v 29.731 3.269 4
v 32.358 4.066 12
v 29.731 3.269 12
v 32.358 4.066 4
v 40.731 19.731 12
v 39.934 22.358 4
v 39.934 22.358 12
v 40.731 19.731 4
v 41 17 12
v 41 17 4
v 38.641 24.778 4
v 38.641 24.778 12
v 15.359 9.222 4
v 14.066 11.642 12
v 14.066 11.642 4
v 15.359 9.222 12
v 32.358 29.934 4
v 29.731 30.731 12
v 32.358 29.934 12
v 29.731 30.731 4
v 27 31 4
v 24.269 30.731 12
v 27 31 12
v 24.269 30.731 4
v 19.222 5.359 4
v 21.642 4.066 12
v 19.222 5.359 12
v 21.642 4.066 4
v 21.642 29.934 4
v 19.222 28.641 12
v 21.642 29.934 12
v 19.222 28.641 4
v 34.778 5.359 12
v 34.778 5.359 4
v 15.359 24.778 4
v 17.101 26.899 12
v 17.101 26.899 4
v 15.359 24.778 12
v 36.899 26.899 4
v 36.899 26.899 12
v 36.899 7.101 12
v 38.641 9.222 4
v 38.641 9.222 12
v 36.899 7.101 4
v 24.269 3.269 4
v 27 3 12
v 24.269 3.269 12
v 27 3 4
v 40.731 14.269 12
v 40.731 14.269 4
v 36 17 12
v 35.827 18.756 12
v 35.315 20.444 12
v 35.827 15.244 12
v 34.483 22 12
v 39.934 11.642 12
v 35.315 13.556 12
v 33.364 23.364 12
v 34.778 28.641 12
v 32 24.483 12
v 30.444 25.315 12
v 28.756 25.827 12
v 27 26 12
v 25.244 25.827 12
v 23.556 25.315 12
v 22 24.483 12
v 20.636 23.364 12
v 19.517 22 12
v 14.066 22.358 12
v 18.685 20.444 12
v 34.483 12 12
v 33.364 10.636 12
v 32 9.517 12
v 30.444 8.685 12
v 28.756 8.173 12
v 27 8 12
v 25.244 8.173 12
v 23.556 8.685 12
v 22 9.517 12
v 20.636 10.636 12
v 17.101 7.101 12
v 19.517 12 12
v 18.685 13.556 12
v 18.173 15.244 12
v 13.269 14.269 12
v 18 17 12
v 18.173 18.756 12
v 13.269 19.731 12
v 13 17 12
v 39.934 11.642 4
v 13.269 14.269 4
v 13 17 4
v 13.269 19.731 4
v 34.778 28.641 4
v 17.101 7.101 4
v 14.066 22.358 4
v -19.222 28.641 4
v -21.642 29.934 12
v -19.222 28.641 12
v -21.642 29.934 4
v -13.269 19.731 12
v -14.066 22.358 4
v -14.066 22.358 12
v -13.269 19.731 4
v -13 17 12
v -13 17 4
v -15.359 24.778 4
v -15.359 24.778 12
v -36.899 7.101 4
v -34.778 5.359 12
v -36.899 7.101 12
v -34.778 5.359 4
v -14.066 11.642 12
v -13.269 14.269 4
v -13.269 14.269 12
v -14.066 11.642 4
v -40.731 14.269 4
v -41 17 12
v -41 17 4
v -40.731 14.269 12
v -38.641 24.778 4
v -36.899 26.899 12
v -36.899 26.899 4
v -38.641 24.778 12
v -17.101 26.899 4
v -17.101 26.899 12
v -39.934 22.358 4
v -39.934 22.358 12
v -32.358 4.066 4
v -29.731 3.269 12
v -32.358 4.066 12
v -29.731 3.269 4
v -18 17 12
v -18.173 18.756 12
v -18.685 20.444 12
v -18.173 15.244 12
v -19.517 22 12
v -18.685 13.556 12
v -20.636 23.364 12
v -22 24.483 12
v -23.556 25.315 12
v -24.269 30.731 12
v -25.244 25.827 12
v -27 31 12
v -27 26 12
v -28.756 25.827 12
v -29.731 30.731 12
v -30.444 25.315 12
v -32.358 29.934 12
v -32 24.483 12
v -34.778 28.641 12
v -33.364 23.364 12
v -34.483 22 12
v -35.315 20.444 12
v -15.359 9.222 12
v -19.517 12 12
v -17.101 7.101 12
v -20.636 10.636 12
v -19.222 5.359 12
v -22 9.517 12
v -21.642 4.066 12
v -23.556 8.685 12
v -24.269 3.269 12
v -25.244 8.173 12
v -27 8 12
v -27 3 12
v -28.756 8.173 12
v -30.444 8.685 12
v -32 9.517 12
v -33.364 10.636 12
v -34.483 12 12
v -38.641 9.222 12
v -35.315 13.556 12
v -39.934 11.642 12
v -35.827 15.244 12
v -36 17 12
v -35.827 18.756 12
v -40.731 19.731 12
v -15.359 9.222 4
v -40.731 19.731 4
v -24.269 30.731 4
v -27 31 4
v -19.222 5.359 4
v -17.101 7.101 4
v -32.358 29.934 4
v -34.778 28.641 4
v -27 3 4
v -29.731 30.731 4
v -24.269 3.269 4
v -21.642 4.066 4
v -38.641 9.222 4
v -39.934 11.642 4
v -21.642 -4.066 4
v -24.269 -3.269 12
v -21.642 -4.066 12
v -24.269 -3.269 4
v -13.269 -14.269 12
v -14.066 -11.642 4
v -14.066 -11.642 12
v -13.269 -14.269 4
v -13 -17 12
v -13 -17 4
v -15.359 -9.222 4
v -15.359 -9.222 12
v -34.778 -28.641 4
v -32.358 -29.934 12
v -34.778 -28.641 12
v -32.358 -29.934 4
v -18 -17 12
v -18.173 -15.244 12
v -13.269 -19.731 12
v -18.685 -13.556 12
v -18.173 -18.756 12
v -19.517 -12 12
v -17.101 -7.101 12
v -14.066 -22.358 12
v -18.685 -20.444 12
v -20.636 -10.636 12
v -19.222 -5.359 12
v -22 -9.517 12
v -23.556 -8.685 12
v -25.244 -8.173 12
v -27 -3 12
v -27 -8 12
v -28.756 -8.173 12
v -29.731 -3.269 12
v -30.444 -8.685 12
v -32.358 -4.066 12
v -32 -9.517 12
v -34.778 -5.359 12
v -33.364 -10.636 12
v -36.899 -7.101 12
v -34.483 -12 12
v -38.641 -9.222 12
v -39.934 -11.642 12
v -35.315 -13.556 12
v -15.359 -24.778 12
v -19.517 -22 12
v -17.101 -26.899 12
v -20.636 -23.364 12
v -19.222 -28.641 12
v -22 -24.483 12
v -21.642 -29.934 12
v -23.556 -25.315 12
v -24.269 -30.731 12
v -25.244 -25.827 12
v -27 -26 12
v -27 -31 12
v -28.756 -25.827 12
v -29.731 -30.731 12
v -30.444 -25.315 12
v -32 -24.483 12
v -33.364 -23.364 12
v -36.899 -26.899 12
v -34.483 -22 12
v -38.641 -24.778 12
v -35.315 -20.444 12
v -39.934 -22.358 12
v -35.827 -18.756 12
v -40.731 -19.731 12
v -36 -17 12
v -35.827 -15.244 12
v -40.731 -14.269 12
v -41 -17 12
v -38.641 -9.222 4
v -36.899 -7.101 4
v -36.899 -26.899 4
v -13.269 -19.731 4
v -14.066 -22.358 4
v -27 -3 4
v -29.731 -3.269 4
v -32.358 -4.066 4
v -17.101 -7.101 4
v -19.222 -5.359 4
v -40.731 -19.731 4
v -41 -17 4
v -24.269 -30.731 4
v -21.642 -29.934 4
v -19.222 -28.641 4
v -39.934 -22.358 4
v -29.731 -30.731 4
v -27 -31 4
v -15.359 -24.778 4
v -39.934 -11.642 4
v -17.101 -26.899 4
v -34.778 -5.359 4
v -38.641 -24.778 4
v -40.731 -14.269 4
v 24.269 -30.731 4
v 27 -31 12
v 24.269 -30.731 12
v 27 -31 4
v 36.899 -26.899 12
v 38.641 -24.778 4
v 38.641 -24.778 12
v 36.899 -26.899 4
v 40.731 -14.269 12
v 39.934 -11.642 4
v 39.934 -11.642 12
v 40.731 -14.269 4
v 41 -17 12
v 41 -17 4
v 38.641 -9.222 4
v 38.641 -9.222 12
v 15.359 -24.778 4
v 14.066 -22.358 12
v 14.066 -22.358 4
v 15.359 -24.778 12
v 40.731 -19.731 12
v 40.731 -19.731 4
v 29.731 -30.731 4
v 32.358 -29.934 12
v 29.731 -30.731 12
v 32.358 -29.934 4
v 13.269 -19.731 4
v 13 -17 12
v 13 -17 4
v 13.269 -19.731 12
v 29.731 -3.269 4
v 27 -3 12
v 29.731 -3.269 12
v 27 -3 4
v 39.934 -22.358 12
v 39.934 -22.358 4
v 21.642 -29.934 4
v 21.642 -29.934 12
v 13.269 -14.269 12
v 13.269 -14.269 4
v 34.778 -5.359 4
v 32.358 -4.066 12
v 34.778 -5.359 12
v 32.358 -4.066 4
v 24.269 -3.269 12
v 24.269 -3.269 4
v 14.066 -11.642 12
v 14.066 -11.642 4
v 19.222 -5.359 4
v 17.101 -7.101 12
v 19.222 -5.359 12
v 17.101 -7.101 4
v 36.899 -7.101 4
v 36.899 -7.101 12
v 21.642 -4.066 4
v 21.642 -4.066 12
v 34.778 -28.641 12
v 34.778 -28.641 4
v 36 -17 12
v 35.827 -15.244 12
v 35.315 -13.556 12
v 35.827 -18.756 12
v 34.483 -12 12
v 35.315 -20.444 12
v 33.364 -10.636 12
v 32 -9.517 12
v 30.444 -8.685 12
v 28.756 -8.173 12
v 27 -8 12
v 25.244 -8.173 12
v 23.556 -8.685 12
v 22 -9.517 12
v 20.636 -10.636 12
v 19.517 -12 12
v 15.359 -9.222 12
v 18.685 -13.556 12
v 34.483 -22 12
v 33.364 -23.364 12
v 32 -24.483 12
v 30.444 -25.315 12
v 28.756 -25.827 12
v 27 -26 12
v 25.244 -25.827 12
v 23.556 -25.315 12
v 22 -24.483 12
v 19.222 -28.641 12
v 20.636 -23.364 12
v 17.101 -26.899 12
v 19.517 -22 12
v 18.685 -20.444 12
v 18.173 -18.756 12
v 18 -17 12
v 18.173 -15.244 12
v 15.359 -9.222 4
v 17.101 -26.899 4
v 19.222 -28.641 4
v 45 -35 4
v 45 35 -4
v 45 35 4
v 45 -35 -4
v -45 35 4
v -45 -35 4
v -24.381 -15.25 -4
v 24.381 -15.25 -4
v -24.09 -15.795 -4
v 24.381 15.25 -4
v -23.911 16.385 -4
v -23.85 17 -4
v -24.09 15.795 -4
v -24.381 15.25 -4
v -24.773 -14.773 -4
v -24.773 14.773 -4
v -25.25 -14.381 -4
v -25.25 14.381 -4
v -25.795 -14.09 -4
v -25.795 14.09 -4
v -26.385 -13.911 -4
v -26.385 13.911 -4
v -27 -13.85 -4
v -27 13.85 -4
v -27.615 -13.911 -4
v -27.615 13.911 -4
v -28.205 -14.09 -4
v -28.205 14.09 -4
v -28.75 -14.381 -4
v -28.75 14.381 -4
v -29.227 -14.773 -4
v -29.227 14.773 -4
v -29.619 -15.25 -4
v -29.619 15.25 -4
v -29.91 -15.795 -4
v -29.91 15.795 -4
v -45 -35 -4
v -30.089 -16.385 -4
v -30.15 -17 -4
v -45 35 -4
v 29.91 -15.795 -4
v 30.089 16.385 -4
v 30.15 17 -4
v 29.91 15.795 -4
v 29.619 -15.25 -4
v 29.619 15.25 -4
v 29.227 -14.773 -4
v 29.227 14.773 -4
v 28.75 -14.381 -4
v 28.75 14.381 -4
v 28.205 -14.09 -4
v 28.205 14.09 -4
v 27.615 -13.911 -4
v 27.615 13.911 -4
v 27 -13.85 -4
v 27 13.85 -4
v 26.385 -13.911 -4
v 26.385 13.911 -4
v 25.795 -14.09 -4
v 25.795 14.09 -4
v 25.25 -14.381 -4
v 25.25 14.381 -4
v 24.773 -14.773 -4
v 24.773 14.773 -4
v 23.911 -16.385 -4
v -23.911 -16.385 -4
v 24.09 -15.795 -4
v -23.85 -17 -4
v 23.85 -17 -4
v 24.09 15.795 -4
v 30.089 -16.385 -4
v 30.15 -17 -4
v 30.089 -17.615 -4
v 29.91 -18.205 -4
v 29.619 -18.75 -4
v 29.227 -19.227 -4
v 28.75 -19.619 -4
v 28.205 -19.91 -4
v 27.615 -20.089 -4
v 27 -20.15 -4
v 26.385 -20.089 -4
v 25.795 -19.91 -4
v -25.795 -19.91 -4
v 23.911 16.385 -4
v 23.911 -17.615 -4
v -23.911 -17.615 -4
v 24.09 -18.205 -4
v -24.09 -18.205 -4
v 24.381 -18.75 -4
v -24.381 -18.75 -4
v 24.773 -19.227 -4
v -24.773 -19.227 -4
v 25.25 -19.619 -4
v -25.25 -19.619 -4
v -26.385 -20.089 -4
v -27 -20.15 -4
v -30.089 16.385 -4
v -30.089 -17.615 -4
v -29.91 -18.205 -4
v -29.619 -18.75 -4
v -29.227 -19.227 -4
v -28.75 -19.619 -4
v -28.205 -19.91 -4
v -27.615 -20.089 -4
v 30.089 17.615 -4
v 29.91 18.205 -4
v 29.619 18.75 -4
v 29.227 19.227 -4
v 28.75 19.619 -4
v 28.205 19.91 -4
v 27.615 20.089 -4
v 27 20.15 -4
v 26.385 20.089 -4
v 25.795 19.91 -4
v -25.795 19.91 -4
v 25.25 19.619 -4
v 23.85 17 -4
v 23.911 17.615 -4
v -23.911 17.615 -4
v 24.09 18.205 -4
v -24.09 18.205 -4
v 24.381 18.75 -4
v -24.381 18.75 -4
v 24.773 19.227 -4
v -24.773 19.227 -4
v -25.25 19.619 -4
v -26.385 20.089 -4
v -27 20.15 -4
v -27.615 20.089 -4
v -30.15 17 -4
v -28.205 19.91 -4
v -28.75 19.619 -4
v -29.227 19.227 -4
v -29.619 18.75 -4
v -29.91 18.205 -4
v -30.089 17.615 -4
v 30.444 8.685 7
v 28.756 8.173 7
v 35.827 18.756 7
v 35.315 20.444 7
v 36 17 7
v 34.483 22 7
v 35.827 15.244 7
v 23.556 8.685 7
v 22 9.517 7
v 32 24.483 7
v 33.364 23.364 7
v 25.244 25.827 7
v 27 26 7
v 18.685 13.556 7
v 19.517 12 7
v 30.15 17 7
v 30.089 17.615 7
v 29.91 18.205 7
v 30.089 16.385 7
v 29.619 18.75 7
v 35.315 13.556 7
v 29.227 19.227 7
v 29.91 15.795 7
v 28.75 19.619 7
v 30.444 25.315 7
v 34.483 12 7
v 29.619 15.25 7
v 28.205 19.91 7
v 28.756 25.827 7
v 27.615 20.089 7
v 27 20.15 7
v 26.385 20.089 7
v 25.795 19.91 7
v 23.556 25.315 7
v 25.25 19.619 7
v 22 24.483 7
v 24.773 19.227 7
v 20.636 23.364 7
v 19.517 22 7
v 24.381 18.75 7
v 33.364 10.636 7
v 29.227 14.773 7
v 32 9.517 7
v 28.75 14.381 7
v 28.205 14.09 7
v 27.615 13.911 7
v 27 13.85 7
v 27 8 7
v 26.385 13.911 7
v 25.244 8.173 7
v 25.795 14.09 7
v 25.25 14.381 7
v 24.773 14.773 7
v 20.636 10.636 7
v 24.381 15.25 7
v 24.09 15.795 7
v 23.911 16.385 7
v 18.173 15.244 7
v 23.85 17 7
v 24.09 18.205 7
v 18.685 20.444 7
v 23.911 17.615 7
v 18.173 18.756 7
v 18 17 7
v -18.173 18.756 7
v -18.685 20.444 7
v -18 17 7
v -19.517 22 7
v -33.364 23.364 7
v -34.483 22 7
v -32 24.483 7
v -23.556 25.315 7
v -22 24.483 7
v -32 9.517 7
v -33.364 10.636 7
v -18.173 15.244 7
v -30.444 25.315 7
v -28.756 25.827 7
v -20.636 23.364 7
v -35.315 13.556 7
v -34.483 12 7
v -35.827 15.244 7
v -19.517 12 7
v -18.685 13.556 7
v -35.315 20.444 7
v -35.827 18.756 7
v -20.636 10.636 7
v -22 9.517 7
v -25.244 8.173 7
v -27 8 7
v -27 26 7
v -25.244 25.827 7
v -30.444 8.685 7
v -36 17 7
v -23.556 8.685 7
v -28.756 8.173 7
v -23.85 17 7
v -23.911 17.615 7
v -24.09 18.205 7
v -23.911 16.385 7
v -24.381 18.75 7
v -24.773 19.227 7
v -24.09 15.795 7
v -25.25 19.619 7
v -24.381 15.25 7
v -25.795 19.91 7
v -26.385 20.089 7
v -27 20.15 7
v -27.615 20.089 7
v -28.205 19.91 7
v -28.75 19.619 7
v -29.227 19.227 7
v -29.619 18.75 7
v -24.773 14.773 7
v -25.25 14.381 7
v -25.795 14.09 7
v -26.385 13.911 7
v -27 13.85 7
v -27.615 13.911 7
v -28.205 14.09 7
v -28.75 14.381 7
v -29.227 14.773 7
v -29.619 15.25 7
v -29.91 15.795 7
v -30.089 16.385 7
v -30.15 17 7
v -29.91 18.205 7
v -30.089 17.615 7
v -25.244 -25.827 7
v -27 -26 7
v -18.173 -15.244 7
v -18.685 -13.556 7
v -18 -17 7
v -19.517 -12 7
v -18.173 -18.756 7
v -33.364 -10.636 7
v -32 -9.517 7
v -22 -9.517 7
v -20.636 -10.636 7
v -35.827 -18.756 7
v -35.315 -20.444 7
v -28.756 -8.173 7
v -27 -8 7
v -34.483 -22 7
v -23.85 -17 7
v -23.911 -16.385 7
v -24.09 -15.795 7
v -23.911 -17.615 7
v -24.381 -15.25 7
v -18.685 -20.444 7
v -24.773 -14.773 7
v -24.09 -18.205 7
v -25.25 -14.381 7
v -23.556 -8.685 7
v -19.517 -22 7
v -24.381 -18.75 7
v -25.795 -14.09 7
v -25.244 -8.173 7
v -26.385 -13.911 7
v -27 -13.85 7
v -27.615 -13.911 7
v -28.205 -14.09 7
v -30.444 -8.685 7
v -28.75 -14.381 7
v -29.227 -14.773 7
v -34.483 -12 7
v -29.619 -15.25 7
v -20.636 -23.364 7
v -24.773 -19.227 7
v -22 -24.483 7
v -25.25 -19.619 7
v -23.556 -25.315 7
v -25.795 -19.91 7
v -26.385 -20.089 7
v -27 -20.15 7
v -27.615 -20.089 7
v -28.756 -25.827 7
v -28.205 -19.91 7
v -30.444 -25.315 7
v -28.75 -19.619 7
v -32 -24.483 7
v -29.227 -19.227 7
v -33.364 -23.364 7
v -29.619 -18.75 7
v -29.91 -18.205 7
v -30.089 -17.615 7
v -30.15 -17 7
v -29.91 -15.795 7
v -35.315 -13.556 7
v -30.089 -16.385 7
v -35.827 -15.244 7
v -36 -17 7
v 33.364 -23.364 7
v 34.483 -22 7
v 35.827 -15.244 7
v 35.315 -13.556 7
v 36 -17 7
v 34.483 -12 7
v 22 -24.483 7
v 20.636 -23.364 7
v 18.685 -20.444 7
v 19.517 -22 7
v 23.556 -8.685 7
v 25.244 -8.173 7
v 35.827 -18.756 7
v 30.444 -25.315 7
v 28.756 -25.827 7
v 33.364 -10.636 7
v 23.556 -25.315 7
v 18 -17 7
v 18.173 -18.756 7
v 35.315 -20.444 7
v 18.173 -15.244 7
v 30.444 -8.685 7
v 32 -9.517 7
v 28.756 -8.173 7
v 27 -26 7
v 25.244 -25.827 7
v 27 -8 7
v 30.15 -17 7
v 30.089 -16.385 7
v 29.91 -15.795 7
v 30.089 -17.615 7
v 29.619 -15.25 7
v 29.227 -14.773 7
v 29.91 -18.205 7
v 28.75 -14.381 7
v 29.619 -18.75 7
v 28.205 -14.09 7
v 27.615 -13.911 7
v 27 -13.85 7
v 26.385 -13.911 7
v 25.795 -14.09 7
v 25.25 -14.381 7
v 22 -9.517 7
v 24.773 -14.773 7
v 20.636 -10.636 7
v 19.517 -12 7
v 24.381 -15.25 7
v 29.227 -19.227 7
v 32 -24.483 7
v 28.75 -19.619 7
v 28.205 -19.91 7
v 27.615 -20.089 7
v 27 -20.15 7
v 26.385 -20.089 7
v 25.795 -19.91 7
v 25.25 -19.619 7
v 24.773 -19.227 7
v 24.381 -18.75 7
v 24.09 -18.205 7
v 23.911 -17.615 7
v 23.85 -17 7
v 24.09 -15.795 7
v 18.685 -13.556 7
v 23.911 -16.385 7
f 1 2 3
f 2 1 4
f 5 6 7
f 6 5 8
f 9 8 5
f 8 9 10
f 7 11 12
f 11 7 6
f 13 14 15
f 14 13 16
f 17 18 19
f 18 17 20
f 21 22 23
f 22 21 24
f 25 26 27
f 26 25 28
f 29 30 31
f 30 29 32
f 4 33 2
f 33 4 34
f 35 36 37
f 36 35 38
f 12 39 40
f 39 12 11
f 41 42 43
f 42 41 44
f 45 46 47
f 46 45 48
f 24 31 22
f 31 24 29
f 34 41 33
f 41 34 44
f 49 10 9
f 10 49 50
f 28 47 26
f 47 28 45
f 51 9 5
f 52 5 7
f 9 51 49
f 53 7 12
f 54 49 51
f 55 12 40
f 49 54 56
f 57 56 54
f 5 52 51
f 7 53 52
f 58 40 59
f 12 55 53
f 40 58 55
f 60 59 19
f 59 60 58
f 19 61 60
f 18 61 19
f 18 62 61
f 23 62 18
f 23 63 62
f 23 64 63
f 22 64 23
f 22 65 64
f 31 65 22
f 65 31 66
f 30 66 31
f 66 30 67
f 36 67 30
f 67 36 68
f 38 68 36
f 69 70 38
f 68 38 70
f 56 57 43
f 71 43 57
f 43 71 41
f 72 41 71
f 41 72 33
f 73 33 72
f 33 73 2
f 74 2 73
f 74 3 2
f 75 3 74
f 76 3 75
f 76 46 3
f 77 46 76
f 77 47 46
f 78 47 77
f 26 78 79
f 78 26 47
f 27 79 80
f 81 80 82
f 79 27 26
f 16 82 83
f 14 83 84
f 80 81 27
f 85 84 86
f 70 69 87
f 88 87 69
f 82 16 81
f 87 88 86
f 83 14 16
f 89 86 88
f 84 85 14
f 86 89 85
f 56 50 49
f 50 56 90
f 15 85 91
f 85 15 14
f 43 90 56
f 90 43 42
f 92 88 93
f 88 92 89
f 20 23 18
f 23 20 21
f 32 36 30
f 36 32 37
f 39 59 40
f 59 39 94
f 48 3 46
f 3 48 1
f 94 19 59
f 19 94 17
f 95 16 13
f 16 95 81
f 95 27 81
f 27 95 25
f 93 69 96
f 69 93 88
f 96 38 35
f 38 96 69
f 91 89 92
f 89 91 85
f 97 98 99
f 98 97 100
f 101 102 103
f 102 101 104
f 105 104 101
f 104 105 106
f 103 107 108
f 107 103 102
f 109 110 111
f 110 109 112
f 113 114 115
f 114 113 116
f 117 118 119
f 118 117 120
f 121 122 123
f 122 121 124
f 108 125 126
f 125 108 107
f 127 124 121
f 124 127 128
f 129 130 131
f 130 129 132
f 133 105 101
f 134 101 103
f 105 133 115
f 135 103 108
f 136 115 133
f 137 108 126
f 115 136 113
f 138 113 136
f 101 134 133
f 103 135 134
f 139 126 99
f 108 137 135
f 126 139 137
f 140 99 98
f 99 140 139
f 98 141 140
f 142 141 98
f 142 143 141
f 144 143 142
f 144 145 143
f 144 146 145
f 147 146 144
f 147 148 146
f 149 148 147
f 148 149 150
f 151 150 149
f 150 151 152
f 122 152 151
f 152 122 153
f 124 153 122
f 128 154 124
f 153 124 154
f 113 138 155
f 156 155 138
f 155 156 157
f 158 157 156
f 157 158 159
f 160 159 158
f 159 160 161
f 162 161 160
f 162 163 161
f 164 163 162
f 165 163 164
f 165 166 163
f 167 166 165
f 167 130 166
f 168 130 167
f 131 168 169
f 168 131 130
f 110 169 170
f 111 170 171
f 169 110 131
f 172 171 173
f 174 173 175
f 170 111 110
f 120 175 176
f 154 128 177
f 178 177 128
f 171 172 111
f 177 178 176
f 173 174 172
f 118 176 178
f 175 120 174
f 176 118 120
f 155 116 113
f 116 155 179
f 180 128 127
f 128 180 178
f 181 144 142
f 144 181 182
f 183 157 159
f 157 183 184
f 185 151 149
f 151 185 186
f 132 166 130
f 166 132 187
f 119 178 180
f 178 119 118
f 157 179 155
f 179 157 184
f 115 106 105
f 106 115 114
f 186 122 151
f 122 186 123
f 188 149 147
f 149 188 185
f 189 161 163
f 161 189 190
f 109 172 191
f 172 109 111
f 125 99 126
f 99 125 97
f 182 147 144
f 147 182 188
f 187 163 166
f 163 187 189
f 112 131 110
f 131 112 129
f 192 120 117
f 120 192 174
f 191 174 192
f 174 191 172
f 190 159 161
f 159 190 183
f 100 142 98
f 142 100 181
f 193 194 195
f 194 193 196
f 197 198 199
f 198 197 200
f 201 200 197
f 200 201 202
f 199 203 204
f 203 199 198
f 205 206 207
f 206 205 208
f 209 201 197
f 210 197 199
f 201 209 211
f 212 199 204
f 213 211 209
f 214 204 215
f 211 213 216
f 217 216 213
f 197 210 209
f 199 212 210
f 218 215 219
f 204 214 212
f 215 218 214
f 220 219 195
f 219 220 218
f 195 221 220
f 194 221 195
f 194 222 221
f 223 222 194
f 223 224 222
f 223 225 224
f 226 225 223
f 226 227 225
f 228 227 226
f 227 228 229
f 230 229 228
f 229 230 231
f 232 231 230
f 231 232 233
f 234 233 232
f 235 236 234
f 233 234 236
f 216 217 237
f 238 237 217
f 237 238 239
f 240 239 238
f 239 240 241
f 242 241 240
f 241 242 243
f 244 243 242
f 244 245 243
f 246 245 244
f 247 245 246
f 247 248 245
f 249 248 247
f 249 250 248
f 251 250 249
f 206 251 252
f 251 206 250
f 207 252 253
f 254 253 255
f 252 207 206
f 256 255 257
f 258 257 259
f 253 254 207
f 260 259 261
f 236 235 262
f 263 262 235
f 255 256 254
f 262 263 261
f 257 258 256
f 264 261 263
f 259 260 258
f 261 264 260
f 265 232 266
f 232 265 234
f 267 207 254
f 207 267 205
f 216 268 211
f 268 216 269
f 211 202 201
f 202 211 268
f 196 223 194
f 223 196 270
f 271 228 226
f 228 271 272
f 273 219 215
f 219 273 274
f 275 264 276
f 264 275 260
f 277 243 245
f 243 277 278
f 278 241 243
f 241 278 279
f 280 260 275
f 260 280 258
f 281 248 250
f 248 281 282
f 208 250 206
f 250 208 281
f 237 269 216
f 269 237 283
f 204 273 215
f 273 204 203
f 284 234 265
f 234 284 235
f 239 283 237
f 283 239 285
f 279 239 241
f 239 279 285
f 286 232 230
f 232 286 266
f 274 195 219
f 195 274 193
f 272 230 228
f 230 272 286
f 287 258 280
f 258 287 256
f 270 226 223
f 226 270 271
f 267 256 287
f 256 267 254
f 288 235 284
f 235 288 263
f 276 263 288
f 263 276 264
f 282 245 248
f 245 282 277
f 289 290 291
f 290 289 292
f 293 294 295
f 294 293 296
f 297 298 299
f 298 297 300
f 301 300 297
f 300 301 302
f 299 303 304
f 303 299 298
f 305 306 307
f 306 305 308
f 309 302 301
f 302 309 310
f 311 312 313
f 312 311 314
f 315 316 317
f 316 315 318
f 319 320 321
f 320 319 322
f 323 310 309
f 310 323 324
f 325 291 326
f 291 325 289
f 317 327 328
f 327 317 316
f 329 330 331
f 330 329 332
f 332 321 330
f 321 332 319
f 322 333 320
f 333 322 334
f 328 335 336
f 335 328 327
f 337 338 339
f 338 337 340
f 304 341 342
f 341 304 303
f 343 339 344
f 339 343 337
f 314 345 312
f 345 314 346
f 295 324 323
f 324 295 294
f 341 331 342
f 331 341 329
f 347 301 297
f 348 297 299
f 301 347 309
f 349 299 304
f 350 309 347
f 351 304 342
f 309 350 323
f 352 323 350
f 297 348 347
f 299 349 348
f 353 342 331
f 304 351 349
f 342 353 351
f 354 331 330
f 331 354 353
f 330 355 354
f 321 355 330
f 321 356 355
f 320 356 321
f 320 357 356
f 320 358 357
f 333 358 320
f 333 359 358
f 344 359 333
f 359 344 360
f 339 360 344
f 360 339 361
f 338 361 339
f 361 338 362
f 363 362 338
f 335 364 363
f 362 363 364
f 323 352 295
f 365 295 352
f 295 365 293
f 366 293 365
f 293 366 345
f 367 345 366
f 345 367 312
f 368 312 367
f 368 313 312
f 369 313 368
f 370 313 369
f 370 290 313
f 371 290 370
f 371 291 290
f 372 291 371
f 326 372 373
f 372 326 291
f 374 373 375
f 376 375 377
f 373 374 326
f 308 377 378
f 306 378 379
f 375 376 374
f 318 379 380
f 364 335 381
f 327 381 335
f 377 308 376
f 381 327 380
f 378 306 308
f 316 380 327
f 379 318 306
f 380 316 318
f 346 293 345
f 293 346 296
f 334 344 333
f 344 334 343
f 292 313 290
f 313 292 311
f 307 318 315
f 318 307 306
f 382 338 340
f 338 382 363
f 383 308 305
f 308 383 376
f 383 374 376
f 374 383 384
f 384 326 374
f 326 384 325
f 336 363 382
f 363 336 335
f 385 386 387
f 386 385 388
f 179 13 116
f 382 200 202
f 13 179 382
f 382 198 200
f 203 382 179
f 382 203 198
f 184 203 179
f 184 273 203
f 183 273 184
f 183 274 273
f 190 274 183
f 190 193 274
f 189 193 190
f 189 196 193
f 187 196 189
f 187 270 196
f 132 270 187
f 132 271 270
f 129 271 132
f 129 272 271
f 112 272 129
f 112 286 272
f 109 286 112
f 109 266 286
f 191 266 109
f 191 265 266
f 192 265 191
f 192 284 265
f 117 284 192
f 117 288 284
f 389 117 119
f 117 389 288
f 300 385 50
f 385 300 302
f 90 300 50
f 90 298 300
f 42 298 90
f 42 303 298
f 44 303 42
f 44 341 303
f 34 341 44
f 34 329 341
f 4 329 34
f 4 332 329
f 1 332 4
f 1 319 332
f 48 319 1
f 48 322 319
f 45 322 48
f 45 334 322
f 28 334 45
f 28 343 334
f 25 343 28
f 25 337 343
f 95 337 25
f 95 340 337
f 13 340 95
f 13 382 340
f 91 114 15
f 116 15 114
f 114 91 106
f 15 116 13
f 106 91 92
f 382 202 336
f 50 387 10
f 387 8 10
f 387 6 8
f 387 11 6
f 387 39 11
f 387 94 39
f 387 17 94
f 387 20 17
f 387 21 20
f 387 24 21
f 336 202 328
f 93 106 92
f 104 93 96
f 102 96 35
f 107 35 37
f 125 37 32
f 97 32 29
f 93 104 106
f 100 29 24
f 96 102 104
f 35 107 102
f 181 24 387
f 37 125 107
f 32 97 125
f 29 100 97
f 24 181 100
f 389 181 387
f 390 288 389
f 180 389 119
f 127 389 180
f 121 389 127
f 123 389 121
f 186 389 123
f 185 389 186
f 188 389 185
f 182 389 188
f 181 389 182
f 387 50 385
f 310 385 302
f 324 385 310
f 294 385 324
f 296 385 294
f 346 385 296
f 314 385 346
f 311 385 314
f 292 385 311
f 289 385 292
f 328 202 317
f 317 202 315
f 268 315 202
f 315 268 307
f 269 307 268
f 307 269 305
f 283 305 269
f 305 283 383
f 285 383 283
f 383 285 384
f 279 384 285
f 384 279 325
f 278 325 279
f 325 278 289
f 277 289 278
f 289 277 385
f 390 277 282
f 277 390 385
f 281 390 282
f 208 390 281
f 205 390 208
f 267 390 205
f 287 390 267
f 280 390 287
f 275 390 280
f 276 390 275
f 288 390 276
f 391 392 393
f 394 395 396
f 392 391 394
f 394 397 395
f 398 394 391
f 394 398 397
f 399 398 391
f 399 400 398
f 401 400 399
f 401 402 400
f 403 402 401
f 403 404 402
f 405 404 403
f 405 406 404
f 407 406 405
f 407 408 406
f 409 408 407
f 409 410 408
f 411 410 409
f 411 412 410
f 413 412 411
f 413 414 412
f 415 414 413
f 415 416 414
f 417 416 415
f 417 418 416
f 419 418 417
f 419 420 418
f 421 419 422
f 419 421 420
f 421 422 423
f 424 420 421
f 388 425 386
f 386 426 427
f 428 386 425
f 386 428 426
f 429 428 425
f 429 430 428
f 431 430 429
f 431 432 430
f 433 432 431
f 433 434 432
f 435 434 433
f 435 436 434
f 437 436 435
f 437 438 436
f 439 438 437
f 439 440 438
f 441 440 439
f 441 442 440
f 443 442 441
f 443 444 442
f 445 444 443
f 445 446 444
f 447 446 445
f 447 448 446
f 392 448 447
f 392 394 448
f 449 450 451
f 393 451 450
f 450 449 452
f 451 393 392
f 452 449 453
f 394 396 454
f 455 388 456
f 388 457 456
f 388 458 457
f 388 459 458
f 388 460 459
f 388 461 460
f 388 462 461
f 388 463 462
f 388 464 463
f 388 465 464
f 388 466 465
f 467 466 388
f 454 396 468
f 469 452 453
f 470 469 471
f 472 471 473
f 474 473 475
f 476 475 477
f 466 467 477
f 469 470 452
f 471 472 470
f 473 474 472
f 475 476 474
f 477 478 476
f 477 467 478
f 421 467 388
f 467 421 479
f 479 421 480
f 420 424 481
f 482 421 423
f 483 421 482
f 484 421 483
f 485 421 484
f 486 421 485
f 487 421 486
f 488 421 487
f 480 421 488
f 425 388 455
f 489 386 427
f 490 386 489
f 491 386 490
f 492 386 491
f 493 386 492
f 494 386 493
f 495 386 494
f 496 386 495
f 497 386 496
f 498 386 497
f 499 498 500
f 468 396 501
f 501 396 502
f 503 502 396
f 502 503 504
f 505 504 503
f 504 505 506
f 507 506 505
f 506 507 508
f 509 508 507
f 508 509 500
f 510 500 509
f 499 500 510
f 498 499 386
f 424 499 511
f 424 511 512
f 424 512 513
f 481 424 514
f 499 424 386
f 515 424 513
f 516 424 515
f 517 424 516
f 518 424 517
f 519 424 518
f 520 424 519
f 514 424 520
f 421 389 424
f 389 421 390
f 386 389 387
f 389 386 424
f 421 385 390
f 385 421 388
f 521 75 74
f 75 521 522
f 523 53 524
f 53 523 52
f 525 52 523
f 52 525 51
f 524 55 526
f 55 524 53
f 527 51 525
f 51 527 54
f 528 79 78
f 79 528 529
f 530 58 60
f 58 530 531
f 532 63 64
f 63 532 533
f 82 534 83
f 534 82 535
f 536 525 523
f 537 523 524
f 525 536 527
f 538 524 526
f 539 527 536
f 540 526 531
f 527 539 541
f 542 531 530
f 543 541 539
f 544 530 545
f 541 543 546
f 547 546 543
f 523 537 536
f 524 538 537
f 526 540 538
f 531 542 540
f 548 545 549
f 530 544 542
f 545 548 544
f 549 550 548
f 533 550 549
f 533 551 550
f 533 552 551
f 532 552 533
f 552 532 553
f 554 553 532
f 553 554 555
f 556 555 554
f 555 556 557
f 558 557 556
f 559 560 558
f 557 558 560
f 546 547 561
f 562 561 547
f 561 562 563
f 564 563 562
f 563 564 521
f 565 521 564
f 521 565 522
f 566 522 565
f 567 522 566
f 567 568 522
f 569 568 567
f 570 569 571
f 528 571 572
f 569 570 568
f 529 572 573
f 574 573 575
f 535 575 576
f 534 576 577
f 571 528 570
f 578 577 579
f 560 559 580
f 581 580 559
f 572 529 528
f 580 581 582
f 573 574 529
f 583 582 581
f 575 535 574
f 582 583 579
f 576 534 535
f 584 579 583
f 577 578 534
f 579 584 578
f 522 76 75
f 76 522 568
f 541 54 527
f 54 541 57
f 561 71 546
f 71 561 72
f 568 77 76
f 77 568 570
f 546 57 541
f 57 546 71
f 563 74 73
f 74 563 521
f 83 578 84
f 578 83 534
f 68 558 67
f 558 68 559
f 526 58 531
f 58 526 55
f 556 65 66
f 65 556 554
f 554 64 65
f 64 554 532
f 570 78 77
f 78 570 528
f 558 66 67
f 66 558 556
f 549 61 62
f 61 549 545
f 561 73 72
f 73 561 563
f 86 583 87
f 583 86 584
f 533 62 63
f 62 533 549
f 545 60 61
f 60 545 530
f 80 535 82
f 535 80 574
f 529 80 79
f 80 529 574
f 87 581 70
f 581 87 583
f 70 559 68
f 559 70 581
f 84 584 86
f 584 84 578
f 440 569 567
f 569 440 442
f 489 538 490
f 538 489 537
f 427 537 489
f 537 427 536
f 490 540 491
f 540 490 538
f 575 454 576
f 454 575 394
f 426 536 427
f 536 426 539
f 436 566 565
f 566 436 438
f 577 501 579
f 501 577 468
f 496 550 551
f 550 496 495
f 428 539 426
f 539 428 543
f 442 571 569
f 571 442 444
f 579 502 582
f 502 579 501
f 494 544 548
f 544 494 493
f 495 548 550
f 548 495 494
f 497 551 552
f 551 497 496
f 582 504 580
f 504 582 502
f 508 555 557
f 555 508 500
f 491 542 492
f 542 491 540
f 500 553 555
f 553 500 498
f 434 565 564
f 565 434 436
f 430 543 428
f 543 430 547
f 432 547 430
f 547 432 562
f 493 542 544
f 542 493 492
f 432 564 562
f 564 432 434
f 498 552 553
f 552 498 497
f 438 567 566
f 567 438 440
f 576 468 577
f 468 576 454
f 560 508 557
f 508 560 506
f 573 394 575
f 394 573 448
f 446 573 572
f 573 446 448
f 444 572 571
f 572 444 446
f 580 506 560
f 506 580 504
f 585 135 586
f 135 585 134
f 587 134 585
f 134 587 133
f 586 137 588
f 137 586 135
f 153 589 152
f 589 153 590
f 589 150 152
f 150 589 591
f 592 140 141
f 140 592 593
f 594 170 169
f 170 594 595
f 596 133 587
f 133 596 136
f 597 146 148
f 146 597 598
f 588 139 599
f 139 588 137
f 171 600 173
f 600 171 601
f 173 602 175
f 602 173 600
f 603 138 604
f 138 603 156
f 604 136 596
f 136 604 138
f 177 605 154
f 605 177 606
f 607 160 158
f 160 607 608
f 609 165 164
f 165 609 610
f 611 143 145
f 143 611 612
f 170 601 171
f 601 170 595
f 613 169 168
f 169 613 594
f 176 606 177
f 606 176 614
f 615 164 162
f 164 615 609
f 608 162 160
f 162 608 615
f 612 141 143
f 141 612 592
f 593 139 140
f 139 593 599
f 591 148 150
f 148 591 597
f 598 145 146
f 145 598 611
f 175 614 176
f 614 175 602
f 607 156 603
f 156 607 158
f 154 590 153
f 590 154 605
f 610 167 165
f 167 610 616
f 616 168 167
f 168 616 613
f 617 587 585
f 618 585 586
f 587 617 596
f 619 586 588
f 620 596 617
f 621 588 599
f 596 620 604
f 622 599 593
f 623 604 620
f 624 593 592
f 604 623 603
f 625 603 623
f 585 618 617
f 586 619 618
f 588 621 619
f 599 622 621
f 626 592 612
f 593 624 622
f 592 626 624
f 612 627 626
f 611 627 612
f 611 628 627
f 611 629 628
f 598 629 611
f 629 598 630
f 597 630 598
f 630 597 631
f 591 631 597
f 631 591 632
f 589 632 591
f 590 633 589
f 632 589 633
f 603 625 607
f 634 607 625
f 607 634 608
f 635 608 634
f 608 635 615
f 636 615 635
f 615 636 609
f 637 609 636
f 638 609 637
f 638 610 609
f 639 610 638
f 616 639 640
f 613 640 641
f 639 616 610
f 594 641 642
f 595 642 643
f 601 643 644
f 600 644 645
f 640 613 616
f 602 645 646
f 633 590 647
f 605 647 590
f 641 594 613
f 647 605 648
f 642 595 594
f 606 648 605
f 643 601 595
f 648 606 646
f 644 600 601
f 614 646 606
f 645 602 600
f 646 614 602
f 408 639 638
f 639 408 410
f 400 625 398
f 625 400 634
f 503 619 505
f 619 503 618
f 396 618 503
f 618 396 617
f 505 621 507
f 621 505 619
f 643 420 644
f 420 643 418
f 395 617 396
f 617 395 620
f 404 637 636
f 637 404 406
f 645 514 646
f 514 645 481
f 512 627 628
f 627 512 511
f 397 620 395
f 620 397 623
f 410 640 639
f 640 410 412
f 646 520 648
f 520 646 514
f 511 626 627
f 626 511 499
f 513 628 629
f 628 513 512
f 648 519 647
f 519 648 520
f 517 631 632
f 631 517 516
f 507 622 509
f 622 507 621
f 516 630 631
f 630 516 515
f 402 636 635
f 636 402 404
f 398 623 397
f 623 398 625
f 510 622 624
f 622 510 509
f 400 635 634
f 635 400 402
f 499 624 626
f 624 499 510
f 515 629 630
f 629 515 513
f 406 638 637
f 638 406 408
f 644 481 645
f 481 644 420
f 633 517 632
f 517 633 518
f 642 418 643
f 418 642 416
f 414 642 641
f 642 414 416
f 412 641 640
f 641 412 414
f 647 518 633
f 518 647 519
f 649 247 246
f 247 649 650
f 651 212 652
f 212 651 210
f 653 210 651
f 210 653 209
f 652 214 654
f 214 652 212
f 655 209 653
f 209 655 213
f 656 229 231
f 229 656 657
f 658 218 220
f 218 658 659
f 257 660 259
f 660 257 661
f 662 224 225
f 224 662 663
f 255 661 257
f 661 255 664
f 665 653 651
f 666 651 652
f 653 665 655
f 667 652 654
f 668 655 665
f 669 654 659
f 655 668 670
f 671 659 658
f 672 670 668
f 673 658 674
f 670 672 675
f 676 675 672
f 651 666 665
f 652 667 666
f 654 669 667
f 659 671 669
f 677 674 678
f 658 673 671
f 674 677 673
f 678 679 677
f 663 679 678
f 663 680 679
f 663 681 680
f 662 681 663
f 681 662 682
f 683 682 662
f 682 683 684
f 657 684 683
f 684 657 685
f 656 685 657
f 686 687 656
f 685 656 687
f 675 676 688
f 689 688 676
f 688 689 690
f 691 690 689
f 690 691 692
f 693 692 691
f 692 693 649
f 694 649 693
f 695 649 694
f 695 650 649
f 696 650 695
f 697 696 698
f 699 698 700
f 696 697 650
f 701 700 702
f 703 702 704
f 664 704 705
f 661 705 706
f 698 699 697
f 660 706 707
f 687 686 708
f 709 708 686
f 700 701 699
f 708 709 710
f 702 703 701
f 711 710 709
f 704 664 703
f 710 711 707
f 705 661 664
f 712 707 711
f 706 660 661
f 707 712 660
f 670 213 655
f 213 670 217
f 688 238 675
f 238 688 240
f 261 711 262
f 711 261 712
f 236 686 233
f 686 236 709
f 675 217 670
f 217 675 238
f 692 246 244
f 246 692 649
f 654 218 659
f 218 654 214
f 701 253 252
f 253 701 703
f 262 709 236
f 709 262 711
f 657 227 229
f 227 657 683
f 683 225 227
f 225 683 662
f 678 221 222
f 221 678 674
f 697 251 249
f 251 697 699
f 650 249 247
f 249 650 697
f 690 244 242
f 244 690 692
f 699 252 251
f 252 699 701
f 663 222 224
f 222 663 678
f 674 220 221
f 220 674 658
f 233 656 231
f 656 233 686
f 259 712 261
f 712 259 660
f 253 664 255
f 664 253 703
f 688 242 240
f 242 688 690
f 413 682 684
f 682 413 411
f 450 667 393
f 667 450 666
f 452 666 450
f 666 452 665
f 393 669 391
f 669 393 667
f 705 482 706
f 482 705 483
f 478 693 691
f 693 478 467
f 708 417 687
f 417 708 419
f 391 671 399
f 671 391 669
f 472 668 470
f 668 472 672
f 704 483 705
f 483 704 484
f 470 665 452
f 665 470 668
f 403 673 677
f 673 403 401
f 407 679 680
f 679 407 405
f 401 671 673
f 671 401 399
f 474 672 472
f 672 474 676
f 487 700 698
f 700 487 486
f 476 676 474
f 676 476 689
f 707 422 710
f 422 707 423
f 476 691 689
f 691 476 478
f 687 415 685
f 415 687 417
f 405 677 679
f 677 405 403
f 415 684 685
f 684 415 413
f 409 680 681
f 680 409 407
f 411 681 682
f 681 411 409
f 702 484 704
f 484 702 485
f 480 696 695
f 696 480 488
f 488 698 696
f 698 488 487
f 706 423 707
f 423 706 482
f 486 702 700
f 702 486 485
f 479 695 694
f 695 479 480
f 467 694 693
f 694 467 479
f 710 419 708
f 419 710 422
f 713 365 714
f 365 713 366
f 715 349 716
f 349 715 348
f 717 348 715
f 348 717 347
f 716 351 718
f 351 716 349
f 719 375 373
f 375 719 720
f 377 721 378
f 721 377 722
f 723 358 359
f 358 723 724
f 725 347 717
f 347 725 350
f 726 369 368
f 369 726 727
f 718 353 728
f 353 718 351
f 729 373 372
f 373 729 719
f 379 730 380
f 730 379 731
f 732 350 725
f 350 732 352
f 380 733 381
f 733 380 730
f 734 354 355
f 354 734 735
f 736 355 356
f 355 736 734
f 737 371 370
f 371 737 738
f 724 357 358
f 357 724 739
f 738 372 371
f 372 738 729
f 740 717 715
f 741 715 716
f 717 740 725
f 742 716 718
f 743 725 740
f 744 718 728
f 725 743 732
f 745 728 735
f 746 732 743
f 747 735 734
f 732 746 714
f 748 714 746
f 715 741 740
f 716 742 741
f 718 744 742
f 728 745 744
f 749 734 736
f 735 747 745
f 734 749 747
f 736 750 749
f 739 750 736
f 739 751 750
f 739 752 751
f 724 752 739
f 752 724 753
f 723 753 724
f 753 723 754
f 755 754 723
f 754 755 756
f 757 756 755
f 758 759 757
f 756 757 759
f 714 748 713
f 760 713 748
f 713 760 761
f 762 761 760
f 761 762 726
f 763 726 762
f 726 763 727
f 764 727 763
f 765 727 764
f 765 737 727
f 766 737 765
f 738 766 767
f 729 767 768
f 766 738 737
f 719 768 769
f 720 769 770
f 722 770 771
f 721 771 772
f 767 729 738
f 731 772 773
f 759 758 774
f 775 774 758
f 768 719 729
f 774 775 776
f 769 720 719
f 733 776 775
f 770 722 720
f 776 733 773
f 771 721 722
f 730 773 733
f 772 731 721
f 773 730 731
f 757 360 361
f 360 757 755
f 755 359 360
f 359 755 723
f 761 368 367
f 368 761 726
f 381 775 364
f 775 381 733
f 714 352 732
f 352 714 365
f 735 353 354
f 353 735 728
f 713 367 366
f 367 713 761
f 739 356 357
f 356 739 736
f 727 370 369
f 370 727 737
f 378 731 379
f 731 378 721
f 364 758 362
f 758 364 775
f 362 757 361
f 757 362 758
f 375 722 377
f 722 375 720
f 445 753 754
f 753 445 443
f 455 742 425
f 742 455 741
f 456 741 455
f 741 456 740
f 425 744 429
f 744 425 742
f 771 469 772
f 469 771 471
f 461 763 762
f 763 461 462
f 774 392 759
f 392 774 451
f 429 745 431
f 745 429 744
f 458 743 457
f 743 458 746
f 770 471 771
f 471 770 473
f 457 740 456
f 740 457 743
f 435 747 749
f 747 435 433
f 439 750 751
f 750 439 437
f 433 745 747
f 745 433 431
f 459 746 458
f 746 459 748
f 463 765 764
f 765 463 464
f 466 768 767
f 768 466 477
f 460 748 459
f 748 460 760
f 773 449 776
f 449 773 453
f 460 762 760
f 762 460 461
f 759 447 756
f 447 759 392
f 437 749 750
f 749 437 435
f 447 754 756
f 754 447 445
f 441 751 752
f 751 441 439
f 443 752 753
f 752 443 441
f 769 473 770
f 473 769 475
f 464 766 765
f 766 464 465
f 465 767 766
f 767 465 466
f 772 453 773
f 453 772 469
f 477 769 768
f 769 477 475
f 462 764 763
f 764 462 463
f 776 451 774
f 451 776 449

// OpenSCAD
$fn = 32;

// ----------------------------------------------------------------------
// Socket pad plate
// bosses with counterbored sockets for the screws
// ----------------------------------------------------------------------

// --- parameters (mm) ---
base_t = 8;           // base plate thickness
boss_h = 8;           // boss height above the base plate
boss_d = 28;          // boss diameter
socket_d = 18;        // socket diameter
socket_depth = 5;     // socket depth from the boss face
bolt_d = 6.3;         // screw clearance hole through the socket floor
plate = [90, 70, 8];  // overall size (x, y, z)
edge = 18;            // boss centre offset from the plate edge
pads = 4;             // boss count, one per corner

// --- derived feature positions (mm) ---
height = base_t + boss_h;        // = 16   overall height of the part
corner_x = plate[0] / 2 - edge;  // = 27   boss centre X
corner_y = plate[1] / 2 - edge;  // = 17   boss centre Y
feature_centers = [
  [corner_x, corner_y],
  [-corner_x, corner_y],
  [-corner_x, -corner_y],
  [corner_x, -corner_y]
];   // boss centres: sockets, holes and the pads themselves are placed from here

// base plate, bosses on feature_centers, socket + through hole in each
difference() {
  union() {
    cube(plate, center = true);
    for (centre = feature_centers)
      translate([centre[0], centre[1], plate[2] / 2 - 1])
        cylinder(d = boss_d, h = boss_h + 1);
  }
  for (centre = feature_centers) {
    translate([centre[0], centre[1], plate[2] / 2 + boss_h - socket_depth])
      cylinder(d = socket_d, h = socket_depth + 1);
    translate([centre[0], centre[1], -height])
      cylinder(d = bolt_d, h = 2 * height + 2);  // through the socket floor
  }
}
